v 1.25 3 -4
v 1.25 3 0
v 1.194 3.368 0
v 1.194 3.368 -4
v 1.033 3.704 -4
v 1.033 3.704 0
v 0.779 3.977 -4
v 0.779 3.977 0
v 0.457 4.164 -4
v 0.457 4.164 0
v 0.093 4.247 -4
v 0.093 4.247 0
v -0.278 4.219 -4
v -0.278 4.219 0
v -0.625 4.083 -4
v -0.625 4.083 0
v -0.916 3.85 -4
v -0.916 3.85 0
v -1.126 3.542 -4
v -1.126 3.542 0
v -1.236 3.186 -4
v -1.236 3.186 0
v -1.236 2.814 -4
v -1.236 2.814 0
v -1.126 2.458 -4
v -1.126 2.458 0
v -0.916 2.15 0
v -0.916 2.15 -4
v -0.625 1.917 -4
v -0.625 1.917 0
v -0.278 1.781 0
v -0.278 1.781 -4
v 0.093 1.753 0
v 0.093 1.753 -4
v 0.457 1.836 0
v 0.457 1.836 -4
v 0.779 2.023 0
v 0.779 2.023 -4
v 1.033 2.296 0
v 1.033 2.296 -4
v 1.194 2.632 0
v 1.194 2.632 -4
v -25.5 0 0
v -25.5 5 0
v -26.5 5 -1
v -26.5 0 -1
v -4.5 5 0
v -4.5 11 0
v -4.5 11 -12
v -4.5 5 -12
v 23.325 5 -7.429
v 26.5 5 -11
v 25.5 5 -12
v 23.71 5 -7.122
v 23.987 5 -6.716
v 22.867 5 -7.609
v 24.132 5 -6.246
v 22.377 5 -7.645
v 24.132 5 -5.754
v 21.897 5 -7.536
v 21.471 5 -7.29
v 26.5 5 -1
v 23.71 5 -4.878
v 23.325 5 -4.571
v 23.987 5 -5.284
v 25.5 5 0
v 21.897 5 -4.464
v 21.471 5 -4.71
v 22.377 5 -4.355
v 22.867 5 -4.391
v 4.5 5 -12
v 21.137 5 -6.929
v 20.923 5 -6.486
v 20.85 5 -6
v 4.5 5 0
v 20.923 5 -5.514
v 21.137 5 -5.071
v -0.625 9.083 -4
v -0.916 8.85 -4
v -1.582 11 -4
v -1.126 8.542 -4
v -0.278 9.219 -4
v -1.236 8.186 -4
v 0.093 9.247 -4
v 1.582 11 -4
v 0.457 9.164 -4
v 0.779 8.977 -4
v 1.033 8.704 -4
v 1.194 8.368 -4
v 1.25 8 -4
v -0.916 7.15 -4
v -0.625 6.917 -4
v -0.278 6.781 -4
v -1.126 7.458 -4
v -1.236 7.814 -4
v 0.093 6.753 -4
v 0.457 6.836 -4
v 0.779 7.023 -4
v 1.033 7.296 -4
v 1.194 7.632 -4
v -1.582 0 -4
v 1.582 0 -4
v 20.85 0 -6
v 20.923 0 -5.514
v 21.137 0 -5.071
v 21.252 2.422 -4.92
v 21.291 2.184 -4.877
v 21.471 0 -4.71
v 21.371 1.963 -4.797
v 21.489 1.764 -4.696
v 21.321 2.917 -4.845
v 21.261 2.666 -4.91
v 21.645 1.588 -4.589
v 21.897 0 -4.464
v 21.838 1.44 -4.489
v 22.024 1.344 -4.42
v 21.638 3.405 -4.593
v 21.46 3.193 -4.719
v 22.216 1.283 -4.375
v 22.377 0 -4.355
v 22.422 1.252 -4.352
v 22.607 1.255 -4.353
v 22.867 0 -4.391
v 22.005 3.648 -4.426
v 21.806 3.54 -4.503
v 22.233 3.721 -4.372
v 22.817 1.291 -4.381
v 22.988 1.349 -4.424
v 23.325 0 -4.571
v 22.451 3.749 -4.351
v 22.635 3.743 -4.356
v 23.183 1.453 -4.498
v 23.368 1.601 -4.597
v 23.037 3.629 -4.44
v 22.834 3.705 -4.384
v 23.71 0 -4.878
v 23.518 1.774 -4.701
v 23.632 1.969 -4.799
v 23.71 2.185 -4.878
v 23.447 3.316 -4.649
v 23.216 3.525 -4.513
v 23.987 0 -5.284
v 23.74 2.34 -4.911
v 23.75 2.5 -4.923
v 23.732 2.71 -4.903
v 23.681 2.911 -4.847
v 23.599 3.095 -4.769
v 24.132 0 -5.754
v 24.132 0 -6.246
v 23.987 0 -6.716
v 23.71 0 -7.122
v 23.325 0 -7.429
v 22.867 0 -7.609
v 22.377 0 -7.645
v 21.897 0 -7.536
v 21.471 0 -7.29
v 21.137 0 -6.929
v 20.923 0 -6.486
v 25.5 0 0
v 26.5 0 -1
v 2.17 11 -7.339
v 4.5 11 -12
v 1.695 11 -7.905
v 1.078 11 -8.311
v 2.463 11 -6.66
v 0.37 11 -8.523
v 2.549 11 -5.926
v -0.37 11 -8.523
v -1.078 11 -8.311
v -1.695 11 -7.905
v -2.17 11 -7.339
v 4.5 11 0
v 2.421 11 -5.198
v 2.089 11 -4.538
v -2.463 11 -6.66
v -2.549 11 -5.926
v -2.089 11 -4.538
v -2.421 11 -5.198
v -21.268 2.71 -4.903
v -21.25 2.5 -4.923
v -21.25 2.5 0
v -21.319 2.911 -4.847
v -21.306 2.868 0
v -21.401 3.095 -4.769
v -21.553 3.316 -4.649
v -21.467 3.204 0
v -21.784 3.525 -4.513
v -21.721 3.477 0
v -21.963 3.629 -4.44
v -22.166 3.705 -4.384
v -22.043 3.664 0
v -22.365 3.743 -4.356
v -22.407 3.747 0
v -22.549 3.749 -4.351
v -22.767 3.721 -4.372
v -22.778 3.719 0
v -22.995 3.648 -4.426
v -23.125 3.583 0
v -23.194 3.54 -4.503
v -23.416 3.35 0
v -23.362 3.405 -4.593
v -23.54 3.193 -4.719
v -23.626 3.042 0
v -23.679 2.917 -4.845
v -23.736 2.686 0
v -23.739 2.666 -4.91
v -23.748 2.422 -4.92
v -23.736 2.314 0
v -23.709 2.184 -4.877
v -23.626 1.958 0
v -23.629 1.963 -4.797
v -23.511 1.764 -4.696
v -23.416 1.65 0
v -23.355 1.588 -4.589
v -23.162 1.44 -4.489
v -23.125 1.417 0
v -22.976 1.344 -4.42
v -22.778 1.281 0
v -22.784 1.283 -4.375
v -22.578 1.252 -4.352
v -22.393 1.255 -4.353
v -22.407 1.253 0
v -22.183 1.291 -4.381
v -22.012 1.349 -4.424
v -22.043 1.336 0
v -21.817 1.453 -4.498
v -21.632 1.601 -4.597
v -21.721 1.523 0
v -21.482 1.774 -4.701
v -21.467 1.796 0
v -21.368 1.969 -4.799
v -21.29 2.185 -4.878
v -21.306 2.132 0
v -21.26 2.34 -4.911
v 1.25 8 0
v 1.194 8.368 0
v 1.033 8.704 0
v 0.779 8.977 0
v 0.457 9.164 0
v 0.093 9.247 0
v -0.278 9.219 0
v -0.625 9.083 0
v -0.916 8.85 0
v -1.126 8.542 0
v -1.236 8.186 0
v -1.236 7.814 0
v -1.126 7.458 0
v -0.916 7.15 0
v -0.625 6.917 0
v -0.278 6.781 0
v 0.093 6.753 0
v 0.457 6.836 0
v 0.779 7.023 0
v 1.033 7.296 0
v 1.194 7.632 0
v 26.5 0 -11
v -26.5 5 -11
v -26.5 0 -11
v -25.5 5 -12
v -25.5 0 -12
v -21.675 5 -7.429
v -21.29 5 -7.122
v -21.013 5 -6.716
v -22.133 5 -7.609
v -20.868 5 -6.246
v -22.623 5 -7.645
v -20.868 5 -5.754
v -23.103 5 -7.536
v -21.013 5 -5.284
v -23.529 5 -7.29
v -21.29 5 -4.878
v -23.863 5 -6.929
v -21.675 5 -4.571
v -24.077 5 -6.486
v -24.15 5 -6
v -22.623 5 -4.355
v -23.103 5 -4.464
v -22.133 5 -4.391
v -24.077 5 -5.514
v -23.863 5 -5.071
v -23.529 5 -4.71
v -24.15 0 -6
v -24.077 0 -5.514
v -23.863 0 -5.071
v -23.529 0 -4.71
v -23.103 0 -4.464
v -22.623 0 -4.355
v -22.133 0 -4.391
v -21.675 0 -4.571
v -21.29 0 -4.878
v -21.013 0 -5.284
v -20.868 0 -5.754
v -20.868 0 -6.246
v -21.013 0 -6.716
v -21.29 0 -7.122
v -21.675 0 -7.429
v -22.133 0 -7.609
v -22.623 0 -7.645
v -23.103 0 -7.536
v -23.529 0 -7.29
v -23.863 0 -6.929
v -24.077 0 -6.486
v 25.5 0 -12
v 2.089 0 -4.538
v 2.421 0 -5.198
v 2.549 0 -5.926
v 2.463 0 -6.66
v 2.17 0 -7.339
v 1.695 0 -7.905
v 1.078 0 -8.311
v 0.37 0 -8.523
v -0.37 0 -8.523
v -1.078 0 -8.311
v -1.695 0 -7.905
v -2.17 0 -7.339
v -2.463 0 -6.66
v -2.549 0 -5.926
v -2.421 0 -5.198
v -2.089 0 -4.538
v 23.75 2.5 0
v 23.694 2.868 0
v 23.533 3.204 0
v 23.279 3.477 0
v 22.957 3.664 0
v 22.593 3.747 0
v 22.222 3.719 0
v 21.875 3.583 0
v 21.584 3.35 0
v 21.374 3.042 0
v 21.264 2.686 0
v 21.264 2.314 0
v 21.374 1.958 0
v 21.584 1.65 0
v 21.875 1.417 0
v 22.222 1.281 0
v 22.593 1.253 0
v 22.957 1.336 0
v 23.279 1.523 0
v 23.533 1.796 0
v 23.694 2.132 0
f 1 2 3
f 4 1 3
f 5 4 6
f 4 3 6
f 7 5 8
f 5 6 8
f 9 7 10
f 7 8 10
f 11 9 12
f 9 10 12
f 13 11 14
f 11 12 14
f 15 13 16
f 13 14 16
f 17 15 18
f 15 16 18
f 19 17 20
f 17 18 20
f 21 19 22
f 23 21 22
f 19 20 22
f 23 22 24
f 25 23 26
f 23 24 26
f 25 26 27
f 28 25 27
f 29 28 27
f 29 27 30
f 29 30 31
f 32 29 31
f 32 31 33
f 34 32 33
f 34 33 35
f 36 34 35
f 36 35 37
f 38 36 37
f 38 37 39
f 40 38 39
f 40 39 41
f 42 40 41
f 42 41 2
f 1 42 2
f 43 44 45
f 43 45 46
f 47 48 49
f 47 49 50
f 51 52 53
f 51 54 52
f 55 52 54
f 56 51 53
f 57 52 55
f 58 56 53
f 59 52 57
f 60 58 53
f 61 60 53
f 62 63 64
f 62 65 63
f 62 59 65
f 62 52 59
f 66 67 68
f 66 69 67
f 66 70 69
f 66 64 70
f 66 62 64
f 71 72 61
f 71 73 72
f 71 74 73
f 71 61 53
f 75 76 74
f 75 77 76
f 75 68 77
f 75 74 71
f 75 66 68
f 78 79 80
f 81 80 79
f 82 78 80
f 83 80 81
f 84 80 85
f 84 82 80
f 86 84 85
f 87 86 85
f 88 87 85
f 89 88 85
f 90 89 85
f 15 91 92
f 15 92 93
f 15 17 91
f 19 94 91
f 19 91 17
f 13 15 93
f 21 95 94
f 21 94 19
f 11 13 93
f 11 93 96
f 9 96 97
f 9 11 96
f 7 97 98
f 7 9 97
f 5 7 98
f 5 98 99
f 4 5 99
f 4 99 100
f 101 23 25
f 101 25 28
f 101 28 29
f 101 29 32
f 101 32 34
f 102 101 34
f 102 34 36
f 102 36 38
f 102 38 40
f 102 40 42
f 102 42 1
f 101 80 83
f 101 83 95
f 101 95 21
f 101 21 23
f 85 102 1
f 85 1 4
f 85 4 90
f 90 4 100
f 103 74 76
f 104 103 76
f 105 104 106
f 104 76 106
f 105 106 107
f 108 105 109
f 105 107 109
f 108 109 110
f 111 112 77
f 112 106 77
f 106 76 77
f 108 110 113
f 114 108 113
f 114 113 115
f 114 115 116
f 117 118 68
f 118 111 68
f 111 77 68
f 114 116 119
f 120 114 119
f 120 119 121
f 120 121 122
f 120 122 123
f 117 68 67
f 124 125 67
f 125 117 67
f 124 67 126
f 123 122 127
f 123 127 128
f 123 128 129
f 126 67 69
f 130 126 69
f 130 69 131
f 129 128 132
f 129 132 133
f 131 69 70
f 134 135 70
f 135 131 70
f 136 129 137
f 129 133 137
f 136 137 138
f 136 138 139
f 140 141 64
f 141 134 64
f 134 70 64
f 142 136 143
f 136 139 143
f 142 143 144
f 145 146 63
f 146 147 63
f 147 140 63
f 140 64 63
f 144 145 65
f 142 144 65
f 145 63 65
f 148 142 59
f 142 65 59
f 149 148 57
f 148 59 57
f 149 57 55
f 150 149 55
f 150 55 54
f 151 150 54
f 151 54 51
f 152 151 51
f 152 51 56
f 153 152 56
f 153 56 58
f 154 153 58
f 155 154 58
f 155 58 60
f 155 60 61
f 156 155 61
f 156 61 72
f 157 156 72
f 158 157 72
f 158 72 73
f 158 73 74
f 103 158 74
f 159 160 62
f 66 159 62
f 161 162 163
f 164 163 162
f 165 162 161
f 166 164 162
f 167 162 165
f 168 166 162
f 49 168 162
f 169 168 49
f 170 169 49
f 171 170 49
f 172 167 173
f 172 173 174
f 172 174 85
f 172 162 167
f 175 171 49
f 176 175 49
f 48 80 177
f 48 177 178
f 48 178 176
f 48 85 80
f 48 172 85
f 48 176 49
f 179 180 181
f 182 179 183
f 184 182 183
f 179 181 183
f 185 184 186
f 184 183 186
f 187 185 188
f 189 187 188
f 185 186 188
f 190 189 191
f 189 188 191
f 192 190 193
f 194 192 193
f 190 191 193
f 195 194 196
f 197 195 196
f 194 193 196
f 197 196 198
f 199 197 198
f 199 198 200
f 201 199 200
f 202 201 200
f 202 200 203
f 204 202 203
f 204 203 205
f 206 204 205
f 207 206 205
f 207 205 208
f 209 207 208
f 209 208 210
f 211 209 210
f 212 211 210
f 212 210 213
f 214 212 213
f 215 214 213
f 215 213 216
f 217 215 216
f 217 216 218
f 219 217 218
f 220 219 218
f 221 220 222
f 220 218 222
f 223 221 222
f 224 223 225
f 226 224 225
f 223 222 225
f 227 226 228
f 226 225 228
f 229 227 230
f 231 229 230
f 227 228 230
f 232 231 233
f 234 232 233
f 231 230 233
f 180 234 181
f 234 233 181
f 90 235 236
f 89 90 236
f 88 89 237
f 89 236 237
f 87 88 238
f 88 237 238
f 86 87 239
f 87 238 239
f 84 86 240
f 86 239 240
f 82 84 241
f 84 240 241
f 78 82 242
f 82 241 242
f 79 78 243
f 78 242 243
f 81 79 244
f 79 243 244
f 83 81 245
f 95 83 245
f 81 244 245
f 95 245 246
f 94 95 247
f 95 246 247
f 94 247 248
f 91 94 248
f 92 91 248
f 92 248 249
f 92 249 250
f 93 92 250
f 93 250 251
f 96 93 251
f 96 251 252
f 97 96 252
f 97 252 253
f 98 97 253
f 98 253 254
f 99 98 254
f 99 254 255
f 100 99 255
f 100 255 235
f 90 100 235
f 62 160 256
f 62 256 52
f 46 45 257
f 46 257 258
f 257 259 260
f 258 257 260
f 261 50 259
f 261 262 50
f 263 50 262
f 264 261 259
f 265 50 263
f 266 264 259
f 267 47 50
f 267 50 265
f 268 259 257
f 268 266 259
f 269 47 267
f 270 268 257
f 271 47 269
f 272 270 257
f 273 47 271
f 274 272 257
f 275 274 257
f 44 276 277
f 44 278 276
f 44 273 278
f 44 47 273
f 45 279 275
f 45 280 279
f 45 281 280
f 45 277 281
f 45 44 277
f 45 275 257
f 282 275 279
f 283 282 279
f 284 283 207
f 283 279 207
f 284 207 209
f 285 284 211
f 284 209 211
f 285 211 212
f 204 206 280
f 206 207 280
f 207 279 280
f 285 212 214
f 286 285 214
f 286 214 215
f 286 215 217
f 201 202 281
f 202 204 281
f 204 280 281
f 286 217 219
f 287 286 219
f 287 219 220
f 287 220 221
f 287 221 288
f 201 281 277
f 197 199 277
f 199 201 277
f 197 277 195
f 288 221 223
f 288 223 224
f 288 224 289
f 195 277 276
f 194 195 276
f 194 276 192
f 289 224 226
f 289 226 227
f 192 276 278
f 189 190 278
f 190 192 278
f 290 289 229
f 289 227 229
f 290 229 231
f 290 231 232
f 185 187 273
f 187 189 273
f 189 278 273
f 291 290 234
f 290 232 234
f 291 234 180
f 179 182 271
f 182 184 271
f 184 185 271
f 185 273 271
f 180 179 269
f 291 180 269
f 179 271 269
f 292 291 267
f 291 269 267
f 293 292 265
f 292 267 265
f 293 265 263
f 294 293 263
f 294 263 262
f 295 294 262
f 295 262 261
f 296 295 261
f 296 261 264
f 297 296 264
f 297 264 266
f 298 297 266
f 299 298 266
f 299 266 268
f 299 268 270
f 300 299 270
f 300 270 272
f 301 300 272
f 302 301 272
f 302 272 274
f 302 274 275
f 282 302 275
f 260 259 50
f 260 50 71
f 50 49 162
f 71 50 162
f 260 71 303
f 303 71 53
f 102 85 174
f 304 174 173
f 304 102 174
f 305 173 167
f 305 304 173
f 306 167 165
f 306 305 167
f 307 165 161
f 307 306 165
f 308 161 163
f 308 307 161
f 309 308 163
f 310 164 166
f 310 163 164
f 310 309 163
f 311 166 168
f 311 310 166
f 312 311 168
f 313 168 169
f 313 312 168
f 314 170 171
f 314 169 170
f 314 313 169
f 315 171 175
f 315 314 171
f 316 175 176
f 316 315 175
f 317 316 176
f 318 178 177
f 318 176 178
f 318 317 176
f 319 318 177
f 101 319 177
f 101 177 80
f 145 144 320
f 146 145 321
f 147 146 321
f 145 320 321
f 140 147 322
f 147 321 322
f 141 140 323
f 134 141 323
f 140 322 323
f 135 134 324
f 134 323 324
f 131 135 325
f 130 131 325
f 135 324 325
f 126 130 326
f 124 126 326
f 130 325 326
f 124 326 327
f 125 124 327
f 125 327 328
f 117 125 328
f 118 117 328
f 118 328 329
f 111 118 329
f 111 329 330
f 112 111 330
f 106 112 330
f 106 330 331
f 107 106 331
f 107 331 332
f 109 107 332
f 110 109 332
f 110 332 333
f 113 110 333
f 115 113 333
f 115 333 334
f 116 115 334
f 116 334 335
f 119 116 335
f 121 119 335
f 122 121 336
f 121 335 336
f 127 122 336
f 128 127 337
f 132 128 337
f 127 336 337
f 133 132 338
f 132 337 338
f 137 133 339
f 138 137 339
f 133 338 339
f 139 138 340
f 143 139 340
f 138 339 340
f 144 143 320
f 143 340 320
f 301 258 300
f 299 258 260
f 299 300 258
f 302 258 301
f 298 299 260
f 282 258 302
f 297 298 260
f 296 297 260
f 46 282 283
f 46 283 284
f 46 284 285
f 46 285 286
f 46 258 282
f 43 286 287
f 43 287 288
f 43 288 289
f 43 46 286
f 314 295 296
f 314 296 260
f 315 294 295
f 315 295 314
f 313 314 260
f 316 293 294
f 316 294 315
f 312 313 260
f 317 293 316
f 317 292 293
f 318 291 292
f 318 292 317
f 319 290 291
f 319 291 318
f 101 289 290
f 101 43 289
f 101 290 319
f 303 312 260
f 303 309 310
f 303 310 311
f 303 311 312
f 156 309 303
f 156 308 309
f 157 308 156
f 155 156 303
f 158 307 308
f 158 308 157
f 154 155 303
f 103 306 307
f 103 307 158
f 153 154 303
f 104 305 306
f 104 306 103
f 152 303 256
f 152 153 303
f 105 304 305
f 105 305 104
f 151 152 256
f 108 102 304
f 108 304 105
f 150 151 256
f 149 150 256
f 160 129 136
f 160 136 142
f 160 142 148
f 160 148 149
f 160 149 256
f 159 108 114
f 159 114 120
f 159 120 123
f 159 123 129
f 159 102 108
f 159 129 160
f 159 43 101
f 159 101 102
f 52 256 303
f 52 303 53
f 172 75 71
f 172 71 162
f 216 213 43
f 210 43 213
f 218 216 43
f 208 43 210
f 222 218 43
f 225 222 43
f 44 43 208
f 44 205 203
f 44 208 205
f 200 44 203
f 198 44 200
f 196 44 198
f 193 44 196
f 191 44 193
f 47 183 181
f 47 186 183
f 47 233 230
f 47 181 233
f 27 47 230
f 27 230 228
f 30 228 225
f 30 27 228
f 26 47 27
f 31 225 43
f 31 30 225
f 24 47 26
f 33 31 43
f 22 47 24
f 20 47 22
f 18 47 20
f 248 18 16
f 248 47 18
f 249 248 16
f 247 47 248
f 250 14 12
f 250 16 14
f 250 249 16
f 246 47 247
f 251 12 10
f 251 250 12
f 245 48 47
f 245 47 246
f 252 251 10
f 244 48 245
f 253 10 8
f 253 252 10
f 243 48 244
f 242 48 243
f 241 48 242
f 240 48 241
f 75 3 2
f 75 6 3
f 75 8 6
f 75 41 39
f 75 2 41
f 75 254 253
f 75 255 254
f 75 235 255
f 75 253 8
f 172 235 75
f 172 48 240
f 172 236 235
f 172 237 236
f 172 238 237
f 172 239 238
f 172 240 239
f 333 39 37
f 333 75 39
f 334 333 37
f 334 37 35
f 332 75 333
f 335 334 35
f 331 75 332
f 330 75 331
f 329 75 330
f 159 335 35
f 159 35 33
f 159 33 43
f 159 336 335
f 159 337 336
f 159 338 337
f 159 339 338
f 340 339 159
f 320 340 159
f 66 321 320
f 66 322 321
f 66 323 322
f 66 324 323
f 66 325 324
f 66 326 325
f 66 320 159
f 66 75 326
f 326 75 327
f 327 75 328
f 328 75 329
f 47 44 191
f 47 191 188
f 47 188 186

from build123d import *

# Parameters (mm, degrees)
BODY_EXTRUDE_DEPTH         = 12
M4X0_7_TAPPED_HOLE6_D      = 3.3
CUT_EXTRUDE1_DEPTH         = 32.10064308
M3X0_5_TAPPED_HOLE1_REACH  = 33.101
M3X0_5_TAPPED_HOLE1_BORE_R = 1.25
CHAMFER1_SIZE              = 1


with BuildPart() as part:
    # Body Sketch → Body Extrude (new body)
    with BuildSketch(Plane.XY):
        Polygon((-26.5, 0), (26.5, 0), (26.5, 5), (4.5, 5), (4.5, 11), (-4.5, 11), (-4.5, 5), (-26.5, 5), align=None)
    extrude(amount=-BODY_EXTRUDE_DEPTH)

    # M4x0.7 Tapped Hole6 (through all)
    with Locations(Plane.XZ):
        with Locations((-22.5, -6), (22.5, -6)):
            Hole(M4X0_7_TAPPED_HOLE6_D / 2)

    # Sketch2 → Cut-Extrude1 (cut, through all)
    with BuildSketch(Plane(origin=(0, 0, 0), x_dir=(1, 0, 0), z_dir=(0, 1, 0))):
        with BuildLine():
            Line((-1.581929202, 4), (1.581929202, 4))
            ThreePointArc((1.581929202, 4), (0, 8.55), (-1.581929202, 4))
        make_face()
    extrude(amount=CUT_EXTRUDE1_DEPTH, mode=Mode.SUBTRACT)

    # M3x0.5 Tapped Hole1 bore → M3x0.5 Tapped Hole1 (cut, up to next)
    with BuildSketch(Plane.XY, mode=Mode.PRIVATE) as m3x0_5_tapped_hole1_sk1:
        with Locations((-22.5, 2.5)):
            Circle(M3X0_5_TAPPED_HOLE1_BORE_R)
    m3x0_5_tapped_hole1_tool1 = extrude(m3x0_5_tapped_hole1_sk1.sketch, amount=-M3X0_5_TAPPED_HOLE1_REACH, mode=Mode.PRIVATE) & part.part
    # M3x0.5 Tapped Hole1 bore → M3x0.5 Tapped Hole1 (cut, up to next)
    with BuildSketch(Plane.XY, mode=Mode.PRIVATE) as m3x0_5_tapped_hole1_sk2:
        with Locations((22.5, 2.5)):
            Circle(M3X0_5_TAPPED_HOLE1_BORE_R)
    m3x0_5_tapped_hole1_tool2 = extrude(m3x0_5_tapped_hole1_sk2.sketch, amount=-M3X0_5_TAPPED_HOLE1_REACH, mode=Mode.PRIVATE) & part.part
    # M3x0.5 Tapped Hole1 bore → M3x0.5 Tapped Hole1 (cut, up to next)
    with BuildSketch(Plane.XY, mode=Mode.PRIVATE) as m3x0_5_tapped_hole1_sk3:
        with Locations((0, 8)):
            Circle(M3X0_5_TAPPED_HOLE1_BORE_R)
    m3x0_5_tapped_hole1_tool3 = extrude(m3x0_5_tapped_hole1_sk3.sketch, amount=-M3X0_5_TAPPED_HOLE1_REACH, mode=Mode.PRIVATE) & part.part
    # M3x0.5 Tapped Hole1 bore → M3x0.5 Tapped Hole1 (cut, up to next)
    with BuildSketch(Plane.XY, mode=Mode.PRIVATE) as m3x0_5_tapped_hole1_sk4:
        with Locations((0, 3)):
            Circle(M3X0_5_TAPPED_HOLE1_BORE_R)
    m3x0_5_tapped_hole1_tool4 = extrude(m3x0_5_tapped_hole1_sk4.sketch, amount=-M3X0_5_TAPPED_HOLE1_REACH, mode=Mode.PRIVATE) & part.part
    add(m3x0_5_tapped_hole1_tool1.solids().sort_by_distance((-22.5, 2.5, 0))[0], mode=Mode.SUBTRACT)
    add(m3x0_5_tapped_hole1_tool2.solids().sort_by_distance((22.5, 2.5, 0))[0], mode=Mode.SUBTRACT)
    add(m3x0_5_tapped_hole1_tool3.solids().sort_by_distance((0, 8, 0))[0], mode=Mode.SUBTRACT)
    add(m3x0_5_tapped_hole1_tool4.solids().sort_by_distance((0, 3, 0))[0], mode=Mode.SUBTRACT)

    # Chamfer1
    chamfer1_edges = [part.edges().sort_by_distance(p)[0] for p in [
        (26.5, 2.5, 0),
        (-26.5, 2.5, 0),
        (26.5, 2.5, -12),
        (-26.5, 2.5, -12),
    ]]
    chamfer(chamfer1_edges, length=CHAMFER1_SIZE)


solid = part.part
